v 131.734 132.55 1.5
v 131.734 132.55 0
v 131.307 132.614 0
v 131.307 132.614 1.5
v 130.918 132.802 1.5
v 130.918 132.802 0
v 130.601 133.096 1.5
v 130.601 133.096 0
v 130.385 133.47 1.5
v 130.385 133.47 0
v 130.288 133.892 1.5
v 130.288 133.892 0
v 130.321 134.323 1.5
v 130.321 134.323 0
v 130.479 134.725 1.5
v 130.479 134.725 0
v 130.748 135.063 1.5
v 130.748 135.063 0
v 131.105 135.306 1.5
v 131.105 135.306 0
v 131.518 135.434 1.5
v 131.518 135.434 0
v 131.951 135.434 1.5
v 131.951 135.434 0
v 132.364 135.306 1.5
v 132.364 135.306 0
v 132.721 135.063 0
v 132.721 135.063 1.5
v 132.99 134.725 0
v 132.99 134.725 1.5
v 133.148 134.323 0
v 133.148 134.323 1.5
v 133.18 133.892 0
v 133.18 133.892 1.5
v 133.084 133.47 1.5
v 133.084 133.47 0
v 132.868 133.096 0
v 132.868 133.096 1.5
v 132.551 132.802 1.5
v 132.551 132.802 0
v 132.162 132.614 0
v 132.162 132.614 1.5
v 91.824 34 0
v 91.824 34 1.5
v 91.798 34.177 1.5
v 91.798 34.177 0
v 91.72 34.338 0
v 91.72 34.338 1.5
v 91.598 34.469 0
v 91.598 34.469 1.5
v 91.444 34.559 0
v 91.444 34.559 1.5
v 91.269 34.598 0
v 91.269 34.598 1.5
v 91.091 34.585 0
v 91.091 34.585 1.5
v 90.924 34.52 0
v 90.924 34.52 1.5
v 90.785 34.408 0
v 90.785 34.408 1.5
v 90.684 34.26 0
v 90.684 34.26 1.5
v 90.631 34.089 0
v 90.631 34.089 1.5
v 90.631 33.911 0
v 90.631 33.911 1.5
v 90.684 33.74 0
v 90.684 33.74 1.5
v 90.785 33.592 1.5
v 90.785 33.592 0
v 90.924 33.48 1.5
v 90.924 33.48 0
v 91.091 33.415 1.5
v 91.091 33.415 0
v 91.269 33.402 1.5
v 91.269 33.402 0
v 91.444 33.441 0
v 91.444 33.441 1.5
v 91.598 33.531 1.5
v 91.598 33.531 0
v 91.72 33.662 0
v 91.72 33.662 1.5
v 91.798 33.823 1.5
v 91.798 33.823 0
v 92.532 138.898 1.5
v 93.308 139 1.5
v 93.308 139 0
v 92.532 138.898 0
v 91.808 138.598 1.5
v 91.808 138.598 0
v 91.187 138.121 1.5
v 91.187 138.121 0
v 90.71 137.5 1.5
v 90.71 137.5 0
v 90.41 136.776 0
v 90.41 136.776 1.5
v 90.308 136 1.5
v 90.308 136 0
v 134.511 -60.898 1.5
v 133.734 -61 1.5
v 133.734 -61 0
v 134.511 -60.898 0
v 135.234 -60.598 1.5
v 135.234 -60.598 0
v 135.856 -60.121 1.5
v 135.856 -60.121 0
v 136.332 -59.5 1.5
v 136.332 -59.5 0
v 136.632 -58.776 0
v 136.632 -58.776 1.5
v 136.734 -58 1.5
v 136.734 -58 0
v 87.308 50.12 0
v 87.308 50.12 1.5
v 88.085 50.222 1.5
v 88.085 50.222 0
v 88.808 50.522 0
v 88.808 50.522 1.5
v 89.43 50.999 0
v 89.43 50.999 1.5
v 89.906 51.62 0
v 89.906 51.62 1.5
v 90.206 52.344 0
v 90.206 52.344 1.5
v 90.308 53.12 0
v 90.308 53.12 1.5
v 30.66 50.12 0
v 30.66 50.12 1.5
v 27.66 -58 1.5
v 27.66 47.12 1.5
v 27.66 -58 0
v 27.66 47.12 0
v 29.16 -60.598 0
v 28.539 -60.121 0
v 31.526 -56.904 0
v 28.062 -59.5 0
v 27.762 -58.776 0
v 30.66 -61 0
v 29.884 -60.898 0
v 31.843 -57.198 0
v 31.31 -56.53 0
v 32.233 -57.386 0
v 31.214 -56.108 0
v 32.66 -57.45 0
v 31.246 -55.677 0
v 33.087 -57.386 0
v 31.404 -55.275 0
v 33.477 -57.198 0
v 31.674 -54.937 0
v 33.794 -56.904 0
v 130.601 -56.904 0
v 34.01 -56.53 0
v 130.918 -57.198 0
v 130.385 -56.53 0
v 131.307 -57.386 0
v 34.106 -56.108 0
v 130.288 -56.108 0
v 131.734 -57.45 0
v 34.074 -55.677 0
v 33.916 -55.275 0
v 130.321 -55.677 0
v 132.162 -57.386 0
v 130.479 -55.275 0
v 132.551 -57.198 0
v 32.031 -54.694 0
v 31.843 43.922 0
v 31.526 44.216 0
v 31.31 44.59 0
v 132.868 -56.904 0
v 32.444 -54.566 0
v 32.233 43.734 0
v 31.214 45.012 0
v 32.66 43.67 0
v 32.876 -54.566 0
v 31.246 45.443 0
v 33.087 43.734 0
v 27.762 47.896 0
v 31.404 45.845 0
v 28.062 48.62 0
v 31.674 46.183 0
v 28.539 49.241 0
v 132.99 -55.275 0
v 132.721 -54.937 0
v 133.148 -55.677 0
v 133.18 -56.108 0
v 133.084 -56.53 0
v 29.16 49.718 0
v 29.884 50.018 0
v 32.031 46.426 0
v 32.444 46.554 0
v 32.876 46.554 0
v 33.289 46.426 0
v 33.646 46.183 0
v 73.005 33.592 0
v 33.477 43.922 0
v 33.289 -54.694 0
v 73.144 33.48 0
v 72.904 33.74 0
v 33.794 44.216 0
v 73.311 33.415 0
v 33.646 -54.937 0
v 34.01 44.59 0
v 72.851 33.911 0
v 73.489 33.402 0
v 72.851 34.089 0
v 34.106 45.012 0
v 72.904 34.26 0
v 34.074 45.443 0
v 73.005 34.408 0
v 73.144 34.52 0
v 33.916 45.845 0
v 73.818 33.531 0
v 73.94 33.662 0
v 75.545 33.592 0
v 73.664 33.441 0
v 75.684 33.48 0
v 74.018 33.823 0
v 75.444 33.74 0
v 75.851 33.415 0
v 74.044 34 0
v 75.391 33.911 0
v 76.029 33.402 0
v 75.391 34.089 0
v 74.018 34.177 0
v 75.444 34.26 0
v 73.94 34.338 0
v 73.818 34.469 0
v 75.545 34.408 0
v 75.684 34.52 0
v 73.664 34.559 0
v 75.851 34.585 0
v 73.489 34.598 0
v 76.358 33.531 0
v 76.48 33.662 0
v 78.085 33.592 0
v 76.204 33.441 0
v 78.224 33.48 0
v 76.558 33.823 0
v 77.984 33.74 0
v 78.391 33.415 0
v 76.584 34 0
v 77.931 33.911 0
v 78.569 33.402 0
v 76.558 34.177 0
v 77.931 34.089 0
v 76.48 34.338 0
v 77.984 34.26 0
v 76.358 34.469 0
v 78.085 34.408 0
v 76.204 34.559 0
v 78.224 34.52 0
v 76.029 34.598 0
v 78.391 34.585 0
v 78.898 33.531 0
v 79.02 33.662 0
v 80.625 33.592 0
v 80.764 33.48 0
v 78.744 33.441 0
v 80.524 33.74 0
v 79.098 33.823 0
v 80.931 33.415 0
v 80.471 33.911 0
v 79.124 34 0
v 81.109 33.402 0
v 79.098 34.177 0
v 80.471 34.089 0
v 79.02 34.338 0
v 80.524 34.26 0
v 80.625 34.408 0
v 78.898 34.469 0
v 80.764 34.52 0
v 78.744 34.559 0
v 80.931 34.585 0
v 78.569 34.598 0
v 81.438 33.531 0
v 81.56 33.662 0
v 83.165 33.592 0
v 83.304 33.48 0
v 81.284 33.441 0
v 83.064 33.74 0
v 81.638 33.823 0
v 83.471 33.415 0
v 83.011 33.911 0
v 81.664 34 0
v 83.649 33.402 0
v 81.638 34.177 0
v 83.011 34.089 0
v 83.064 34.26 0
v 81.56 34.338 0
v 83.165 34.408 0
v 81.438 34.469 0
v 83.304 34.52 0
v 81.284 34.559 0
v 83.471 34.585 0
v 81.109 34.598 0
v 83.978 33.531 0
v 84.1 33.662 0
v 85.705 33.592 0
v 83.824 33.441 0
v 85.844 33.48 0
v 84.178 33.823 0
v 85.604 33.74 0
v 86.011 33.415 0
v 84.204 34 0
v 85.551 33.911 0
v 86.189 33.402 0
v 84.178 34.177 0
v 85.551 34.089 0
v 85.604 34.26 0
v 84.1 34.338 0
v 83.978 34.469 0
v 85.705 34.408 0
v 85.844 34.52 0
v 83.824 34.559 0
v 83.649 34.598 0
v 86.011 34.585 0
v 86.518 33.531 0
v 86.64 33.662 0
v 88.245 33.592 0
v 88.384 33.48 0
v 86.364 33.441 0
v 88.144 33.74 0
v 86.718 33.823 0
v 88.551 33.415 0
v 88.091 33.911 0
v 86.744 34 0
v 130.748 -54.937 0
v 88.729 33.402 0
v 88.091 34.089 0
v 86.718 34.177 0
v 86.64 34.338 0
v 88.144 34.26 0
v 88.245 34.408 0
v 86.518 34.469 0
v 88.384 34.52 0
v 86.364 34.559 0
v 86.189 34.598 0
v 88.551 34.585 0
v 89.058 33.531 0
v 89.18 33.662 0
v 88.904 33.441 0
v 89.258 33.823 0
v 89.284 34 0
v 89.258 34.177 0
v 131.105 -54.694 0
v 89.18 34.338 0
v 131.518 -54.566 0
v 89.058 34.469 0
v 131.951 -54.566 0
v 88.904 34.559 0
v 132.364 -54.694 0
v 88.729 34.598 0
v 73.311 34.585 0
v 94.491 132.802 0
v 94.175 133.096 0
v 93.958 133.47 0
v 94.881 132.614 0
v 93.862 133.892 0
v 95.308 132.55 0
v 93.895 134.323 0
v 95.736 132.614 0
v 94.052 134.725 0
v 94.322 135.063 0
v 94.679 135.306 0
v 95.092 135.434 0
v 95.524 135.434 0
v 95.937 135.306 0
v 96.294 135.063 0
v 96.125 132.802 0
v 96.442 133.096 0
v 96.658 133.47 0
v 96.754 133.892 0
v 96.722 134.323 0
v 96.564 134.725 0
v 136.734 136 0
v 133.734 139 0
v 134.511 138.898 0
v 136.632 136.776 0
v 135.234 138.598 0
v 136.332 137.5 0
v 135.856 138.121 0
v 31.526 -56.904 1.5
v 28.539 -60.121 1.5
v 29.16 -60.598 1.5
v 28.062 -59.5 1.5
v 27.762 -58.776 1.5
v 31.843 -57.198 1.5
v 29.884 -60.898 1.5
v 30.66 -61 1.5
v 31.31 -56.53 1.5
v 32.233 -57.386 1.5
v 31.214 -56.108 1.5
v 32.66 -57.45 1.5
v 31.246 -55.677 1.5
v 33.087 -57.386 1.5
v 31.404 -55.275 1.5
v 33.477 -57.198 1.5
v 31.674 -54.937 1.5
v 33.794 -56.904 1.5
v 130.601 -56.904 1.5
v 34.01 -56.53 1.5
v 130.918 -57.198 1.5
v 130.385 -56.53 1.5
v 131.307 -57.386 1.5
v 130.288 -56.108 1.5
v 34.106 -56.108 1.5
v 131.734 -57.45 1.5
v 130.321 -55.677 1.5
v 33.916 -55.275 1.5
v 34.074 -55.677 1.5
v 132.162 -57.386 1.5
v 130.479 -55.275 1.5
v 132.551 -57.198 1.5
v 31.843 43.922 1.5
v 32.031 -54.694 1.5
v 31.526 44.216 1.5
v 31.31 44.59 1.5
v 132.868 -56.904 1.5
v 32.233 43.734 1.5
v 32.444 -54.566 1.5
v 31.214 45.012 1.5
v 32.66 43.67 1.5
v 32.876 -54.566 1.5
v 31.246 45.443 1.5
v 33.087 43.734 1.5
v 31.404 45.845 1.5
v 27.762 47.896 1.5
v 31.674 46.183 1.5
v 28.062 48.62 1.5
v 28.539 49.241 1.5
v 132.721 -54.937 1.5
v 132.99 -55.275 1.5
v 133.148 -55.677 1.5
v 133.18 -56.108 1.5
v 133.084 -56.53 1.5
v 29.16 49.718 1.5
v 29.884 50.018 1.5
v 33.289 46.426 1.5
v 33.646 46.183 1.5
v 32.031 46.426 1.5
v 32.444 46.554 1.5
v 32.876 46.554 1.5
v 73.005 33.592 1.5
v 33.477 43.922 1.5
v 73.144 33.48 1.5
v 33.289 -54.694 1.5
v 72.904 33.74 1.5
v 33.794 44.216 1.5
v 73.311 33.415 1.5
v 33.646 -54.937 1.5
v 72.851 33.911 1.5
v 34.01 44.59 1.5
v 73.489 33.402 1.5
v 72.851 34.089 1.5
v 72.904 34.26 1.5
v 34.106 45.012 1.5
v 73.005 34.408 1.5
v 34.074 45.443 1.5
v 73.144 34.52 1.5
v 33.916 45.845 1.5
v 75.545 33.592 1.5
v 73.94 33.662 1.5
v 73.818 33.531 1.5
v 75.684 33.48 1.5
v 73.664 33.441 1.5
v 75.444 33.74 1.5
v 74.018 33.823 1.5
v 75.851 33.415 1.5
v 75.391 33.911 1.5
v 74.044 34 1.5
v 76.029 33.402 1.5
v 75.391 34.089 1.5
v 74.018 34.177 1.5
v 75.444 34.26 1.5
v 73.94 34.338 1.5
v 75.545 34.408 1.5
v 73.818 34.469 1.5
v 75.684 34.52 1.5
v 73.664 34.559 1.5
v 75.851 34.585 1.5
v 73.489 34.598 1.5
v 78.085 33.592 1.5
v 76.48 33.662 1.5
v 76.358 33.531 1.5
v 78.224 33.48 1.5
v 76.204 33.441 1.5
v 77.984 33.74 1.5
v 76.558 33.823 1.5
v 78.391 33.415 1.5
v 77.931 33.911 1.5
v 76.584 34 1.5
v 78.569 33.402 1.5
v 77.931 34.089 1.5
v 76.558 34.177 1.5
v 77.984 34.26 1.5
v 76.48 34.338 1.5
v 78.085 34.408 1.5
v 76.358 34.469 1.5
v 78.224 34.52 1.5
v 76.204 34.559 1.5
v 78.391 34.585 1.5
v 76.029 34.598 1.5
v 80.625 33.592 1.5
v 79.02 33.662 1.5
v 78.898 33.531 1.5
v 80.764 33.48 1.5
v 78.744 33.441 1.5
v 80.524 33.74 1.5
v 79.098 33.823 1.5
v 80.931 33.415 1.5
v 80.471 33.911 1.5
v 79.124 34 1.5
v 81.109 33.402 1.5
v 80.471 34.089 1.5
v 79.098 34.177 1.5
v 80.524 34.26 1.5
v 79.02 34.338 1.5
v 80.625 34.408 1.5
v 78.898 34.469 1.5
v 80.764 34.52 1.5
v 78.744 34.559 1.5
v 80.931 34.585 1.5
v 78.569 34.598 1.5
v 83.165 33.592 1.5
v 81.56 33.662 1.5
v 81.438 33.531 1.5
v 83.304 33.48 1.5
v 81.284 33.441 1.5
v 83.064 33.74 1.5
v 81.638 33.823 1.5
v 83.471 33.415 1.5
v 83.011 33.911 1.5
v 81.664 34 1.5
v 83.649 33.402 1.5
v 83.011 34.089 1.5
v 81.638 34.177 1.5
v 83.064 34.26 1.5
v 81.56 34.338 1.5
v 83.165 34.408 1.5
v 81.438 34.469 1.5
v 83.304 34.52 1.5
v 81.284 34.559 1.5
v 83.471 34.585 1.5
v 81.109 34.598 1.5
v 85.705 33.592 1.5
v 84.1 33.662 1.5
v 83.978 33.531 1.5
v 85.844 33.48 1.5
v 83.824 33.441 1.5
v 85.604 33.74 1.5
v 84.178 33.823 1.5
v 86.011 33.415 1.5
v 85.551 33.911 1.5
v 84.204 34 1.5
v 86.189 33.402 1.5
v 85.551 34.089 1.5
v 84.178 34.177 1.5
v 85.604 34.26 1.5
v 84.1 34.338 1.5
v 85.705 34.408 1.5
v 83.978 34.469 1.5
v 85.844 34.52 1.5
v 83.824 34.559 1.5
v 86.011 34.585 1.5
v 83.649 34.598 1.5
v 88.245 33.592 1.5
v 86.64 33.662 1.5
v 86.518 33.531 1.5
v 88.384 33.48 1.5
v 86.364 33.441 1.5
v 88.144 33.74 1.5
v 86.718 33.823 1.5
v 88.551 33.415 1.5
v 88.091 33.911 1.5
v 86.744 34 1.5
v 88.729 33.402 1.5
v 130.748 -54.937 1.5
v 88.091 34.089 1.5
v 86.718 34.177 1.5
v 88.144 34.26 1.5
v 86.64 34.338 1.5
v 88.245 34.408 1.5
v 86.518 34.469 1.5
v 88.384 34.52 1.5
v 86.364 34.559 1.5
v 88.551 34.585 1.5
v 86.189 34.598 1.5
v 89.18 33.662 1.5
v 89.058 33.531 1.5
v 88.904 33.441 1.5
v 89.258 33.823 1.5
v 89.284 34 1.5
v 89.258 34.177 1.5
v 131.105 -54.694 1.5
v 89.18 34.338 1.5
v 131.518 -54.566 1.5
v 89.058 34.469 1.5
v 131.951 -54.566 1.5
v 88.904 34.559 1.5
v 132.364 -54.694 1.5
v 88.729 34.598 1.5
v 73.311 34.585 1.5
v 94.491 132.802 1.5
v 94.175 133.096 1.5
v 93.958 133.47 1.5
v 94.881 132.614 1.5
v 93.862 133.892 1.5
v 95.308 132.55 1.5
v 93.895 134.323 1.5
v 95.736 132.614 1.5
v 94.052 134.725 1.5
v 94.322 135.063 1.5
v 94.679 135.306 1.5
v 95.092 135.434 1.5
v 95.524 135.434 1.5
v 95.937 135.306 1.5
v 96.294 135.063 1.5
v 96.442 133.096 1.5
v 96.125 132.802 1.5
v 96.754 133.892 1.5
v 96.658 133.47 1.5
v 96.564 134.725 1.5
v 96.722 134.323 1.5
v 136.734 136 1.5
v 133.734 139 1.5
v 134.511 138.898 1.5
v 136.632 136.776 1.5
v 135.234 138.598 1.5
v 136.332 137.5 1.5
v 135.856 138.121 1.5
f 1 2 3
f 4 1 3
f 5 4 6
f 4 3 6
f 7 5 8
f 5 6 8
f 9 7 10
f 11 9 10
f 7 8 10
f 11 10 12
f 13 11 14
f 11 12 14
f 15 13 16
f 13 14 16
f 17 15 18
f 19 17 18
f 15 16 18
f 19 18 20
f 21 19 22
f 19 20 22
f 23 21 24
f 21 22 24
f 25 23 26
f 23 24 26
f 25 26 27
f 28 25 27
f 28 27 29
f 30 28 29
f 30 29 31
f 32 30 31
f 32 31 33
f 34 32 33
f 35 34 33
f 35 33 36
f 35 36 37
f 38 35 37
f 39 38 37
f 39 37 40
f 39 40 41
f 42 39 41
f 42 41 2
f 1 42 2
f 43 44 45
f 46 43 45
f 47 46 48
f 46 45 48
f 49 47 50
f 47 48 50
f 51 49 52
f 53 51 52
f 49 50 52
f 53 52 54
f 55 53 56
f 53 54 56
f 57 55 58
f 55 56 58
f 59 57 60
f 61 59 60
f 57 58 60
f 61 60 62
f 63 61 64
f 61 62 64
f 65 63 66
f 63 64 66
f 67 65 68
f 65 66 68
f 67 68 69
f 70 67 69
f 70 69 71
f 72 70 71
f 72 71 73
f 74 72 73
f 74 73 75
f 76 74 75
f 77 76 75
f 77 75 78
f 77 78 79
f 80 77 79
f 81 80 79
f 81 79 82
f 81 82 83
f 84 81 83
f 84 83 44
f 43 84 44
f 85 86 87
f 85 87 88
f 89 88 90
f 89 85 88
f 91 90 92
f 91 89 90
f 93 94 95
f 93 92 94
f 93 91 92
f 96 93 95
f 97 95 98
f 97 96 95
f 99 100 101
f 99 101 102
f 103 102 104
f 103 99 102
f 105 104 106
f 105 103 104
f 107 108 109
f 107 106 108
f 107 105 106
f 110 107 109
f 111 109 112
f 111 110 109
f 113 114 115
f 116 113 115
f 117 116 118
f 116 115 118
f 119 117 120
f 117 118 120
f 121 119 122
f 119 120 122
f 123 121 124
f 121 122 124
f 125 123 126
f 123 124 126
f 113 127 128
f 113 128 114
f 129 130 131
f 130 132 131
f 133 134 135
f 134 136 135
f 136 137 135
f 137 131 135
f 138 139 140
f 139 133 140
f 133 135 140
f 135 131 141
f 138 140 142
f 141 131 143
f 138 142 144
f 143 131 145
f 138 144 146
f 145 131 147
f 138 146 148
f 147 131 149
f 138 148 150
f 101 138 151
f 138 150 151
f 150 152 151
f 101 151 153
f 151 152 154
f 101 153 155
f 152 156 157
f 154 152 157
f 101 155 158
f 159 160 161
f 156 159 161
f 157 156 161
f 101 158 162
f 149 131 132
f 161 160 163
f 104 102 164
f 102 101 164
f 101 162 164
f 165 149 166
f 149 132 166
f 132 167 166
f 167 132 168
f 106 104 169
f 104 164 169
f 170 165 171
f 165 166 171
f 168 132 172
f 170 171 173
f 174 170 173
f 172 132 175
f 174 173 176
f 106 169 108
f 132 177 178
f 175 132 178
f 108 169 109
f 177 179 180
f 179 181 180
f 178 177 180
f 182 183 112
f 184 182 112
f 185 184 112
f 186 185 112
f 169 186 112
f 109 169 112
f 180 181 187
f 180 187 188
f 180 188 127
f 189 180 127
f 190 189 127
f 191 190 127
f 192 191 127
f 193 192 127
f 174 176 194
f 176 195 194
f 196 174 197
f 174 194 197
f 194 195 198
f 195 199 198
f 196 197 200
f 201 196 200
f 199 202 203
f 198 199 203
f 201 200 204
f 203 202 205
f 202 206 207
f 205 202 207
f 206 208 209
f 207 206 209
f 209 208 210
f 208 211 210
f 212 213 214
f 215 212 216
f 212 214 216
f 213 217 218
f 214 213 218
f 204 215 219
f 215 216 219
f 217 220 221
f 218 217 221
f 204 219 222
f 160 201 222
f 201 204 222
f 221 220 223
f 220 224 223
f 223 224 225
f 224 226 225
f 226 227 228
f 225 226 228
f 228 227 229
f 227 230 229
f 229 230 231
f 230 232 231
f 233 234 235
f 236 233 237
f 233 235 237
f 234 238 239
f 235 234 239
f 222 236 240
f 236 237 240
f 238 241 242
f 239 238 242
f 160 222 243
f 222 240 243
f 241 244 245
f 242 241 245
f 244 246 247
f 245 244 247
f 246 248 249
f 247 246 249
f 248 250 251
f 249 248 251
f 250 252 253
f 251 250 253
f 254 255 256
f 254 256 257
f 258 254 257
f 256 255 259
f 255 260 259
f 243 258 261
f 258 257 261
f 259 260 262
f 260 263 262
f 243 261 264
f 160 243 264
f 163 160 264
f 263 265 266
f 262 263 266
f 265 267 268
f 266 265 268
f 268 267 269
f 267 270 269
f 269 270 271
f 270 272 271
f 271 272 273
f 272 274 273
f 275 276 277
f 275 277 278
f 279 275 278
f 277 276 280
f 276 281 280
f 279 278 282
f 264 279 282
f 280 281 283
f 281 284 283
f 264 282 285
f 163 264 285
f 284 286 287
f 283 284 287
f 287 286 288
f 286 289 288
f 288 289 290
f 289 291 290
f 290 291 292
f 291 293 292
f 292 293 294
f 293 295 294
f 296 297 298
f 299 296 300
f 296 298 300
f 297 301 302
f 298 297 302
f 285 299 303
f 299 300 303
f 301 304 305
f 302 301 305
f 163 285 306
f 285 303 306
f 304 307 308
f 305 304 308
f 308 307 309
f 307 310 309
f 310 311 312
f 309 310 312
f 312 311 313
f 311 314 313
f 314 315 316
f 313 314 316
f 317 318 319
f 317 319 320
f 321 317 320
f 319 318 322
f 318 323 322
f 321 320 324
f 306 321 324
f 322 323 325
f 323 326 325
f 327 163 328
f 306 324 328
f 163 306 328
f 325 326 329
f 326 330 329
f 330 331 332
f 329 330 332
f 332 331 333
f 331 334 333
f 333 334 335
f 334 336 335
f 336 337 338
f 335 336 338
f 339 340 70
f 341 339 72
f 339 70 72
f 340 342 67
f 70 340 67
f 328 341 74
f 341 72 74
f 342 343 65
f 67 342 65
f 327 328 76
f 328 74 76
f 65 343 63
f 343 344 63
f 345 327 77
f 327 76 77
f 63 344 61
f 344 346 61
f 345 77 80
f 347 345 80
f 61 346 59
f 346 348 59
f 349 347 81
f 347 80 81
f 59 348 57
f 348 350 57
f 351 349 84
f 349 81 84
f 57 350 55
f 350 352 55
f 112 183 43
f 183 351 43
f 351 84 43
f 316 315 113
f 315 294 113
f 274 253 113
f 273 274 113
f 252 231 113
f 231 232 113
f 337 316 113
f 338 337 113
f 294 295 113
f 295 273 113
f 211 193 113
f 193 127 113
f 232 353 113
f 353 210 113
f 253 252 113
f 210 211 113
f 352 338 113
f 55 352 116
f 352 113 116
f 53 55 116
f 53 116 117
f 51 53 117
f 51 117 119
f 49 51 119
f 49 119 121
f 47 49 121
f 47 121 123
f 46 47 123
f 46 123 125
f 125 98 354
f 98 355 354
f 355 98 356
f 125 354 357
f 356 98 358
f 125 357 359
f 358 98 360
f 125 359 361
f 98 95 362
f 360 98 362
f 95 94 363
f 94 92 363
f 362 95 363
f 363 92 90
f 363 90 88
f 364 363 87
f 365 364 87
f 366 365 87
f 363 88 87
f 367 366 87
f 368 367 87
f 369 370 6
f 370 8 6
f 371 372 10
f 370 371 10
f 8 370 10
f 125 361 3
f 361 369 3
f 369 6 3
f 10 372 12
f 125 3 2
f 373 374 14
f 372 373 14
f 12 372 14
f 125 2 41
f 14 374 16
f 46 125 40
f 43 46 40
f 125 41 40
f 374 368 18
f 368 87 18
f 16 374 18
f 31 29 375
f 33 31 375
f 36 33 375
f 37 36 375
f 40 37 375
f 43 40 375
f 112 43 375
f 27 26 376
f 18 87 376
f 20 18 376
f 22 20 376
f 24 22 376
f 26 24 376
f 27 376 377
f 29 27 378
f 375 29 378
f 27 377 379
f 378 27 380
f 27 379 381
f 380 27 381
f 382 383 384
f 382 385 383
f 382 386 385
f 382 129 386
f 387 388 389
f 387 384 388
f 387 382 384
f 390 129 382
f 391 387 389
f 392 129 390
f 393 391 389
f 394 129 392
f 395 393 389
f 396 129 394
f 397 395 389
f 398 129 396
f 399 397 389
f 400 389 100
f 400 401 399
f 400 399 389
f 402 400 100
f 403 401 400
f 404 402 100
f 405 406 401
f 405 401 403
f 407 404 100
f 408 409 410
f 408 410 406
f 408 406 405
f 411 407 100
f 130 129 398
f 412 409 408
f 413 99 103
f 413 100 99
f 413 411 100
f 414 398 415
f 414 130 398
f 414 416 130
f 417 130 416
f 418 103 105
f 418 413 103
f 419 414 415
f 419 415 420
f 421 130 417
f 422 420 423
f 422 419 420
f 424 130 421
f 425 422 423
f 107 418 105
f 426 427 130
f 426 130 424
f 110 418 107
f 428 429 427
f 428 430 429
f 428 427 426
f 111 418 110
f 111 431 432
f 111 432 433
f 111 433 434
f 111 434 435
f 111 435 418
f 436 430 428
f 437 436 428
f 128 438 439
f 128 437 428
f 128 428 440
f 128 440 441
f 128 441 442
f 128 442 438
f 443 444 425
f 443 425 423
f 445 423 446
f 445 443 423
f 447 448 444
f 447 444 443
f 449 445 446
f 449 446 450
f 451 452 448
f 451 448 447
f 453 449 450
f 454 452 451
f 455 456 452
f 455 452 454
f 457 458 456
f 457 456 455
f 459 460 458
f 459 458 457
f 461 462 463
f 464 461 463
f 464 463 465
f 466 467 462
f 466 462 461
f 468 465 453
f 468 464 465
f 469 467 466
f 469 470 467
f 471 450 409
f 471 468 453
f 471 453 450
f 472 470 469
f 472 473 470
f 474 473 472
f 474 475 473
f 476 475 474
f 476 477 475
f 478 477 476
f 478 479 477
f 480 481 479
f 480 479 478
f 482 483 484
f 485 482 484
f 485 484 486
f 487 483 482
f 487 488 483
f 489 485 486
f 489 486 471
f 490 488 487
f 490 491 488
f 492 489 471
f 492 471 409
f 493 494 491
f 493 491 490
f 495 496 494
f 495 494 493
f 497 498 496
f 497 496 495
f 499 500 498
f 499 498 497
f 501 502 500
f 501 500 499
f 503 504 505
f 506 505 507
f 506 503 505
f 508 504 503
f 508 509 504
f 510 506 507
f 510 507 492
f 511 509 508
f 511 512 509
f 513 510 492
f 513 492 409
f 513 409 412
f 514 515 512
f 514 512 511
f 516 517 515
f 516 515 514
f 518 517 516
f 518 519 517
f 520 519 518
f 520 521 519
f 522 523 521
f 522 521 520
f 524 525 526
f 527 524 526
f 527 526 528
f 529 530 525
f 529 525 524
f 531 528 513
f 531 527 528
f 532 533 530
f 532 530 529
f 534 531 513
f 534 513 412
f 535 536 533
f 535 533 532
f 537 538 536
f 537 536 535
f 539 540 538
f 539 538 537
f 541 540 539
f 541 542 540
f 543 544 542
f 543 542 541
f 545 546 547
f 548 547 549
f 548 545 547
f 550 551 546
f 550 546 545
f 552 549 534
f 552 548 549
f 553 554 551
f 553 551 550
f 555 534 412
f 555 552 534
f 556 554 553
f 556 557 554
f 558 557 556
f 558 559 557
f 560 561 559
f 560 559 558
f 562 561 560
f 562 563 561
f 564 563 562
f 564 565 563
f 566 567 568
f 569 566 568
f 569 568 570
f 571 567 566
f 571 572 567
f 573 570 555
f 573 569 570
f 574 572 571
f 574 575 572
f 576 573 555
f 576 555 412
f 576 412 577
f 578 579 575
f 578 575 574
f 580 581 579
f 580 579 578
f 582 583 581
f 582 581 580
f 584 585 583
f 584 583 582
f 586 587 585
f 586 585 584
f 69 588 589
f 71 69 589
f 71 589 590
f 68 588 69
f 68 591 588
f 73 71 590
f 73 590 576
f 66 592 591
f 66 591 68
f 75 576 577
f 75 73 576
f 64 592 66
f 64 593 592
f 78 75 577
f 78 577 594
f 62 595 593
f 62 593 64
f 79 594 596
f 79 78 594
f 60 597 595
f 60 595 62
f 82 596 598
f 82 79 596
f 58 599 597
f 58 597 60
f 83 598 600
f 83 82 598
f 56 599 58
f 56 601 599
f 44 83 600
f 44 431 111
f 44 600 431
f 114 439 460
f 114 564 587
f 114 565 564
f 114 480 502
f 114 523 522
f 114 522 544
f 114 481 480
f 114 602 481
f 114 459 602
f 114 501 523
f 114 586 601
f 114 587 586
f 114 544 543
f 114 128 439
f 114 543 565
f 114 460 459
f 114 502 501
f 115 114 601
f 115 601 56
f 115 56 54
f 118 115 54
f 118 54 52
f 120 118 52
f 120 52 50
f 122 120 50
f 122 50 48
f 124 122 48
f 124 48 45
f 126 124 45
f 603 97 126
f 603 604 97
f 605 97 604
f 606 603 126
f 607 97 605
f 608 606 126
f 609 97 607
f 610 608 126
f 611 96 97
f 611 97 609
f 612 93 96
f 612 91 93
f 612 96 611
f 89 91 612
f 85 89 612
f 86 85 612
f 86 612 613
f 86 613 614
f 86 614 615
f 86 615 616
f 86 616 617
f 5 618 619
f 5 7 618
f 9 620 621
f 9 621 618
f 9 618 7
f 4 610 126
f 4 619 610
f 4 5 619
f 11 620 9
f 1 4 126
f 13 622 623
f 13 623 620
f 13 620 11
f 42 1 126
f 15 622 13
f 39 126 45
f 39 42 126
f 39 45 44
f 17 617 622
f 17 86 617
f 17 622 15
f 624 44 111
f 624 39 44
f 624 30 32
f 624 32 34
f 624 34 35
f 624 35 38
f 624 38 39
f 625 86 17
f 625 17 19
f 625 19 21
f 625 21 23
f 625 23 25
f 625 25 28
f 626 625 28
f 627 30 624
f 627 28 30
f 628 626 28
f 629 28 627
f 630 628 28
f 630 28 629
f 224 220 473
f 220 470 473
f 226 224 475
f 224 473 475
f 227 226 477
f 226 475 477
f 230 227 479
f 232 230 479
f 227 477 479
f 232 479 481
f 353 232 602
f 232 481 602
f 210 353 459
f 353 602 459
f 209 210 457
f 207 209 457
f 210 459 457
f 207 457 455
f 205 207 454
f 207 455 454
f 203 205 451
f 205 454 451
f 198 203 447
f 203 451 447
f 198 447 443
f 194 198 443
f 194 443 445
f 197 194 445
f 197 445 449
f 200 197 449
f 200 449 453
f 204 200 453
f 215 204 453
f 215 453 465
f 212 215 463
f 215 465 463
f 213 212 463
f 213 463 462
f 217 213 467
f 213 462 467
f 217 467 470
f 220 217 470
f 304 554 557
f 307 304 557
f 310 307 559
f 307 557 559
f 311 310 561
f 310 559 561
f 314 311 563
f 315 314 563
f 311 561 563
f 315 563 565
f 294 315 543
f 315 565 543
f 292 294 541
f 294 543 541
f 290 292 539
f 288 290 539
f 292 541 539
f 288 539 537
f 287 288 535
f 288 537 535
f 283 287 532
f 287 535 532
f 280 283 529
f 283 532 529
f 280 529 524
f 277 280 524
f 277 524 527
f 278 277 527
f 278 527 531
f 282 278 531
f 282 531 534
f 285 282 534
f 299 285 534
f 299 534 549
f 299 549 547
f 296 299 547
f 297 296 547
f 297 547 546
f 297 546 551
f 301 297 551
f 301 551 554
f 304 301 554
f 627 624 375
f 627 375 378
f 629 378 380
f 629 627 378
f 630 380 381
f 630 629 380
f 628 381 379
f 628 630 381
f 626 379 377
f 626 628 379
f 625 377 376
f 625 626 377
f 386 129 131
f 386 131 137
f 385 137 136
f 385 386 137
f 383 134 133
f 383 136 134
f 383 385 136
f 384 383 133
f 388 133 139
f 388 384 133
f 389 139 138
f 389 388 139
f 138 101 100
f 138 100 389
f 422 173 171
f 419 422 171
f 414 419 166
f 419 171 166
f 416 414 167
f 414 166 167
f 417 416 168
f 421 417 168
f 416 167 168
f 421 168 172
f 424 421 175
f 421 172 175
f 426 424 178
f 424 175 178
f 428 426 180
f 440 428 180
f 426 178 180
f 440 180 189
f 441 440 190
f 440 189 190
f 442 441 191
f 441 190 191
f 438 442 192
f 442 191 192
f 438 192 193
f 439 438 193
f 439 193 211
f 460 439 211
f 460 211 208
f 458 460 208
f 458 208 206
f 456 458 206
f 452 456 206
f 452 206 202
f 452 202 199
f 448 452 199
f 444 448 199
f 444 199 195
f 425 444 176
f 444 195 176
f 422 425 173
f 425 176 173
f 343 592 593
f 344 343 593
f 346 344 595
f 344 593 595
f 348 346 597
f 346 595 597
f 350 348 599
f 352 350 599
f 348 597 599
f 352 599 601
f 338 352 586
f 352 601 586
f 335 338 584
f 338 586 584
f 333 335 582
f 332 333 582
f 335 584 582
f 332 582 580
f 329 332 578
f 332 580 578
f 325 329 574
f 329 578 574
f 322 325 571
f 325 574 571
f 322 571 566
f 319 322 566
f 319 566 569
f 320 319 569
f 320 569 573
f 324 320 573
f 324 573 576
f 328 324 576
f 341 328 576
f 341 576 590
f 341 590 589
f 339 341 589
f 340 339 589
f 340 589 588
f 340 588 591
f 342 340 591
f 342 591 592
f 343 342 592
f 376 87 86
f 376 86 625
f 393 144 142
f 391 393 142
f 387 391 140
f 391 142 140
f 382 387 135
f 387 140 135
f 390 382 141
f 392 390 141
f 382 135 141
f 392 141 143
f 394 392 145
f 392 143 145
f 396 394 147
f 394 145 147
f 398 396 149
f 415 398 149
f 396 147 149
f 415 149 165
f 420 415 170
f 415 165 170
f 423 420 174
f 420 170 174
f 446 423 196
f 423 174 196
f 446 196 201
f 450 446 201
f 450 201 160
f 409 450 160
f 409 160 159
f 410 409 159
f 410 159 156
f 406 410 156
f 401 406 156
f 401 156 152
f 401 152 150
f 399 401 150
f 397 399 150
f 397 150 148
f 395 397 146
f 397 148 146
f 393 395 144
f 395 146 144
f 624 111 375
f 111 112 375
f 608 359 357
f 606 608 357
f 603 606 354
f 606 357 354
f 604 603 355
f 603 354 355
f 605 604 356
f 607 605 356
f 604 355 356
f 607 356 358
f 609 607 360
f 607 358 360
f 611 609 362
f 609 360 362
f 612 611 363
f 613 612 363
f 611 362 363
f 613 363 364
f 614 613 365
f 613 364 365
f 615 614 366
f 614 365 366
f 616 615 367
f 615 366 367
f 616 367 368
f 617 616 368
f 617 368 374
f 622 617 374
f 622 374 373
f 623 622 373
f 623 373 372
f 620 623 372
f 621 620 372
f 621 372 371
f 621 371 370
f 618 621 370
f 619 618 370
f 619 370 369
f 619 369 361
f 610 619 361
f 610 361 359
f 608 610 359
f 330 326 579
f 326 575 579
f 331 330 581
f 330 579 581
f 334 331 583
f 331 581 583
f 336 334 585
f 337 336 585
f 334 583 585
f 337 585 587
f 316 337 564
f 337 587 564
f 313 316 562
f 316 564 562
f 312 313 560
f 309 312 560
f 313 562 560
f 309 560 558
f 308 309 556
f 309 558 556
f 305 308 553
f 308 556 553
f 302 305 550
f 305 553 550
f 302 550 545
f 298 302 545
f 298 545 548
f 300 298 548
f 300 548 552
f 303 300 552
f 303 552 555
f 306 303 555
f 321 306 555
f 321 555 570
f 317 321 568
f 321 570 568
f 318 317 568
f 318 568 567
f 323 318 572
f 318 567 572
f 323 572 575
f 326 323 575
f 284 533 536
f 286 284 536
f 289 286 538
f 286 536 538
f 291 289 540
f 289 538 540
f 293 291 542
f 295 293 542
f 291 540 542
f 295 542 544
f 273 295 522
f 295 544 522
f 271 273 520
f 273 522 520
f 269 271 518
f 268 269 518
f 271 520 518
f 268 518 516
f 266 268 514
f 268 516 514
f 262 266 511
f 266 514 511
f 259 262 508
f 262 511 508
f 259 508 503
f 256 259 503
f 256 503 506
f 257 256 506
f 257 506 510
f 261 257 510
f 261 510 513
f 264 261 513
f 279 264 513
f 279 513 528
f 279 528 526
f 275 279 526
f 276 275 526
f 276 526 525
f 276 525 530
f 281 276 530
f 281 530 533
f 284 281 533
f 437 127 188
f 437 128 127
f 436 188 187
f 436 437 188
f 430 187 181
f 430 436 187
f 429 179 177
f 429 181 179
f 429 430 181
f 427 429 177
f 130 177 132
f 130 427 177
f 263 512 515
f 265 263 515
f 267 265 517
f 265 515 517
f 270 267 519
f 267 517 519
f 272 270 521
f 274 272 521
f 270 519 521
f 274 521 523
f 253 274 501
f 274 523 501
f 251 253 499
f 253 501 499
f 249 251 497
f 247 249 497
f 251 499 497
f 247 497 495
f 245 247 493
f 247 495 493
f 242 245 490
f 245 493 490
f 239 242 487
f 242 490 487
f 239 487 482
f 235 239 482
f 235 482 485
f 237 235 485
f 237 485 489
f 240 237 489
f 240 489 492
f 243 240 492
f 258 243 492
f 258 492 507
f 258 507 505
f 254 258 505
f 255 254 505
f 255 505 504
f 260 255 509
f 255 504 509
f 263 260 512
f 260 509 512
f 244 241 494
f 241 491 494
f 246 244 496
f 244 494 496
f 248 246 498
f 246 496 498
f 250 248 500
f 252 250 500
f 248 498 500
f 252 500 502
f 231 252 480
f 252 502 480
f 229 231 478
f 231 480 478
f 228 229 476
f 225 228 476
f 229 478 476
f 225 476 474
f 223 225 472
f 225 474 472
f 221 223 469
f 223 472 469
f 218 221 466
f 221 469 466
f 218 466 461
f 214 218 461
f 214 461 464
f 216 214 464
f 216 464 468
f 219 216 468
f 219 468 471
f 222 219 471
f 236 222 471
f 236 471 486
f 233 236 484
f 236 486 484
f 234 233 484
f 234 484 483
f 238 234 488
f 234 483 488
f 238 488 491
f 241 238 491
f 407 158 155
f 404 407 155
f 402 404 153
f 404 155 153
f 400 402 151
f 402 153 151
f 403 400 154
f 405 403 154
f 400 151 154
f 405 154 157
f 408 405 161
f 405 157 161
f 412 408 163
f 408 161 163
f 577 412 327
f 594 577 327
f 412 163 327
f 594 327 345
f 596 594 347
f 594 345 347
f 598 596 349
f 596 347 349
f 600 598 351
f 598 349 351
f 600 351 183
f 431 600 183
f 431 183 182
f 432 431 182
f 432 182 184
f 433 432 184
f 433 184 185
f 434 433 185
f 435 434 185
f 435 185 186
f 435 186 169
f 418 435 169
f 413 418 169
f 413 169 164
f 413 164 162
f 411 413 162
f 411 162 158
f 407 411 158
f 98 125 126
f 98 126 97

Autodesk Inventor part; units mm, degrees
ref_plane "YZ Plane" through (0, 0, 0) normal (1, 0, 0) x (0, 1, 0)
ref_plane "РабПлоскость1" through (0, 0, 0) normal (0, 0, 1) x (1, 0, 0)
ref_plane "РабПлоскость2" through (0, 0, 0) normal (0, 0, 1) x (1, 0, 0)
sketch "Эскиз2" plane through (0, 0, 0) normal (0, 0, 1) x (1, 0, 0)
  line L0 (164.5082, 55.3787) -> (164.5082, 22.6213)
  line L1 (152.0082, 55.3787) -> (164.5082, 55.3787)
  spline S0 degree 4 poles (142.0082, 66.7804) (141.9936, 65.5806) (142.2897, 63.8407) (143.0904, 61.8123) (144.7867, 59.6039) (146.7684, 57.7973) (148.9036, 56.5519) (150.6395, 55.9298) (152.0082, 55.3787) knots 0 0 0 0 0 0.305903 0.428365 0.551581 0.676311 1 1 1 1 1
  line L2 (142.0082, 89.6988) -> (142.0082, 66.7804)
  spline S1 degree 4 poles (142.0976, 90.5077) (142.1863, 90.3272) (142.1406, 90.1079) (142.065, 89.9075) (142.0082, 89.6988) knots 0 0 0 0 0 1 1 1 1 1
  ellipse E0 centre (144.0082, 89.6716) end of major axis (144.0082, 92.5) minor radius 2 (144.0082, 92.5) -> (142.0976, 90.5077) ccw
  line L3 (144.0082, 92.5) -> (149.4338, 92.5)
  line L4 (149.4338, 92.5) -> (149.4338, 92.525)
  line L5 (149.4338, 92.525) -> (142.946, 92.525)
  ellipse E1 centre (142.946, 98.525) end of major axis (136.7344, 98.525) minor radius 6 (136.7344, 98.525) -> (142.946, 92.525) ccw
  line L6 (136.7344, 98.525) -> (136.7344, 100.025)
  ellipse E2 centre (142.946, 100.025) end of major axis (136.7344, 100.025) minor radius 6 (142.946, 106.025) -> (136.7344, 100.025) ccw
  line L7 (142.946, 106.025) -> (149.4338, 106.025)
  line L8 (149.4338, 106.025) -> (149.4338, 106.05)
  line L9 (149.4338, 106.05) -> (144.0082, 106.05)
  ellipse E3 centre (144.0082, 108.8784) end of major axis (144.0082, 106.05) minor radius 2 (142.0976, 108.0423) -> (144.0082, 106.05) ccw
  spline S2 degree 4 poles (142.0082, 108.8512) (142.0222, 108.6489) (142.0418, 108.4466) (142.067, 108.2444) (142.0976, 108.0423) knots 0 0 0 0 0 1 1 1 1 1
  line L10 (142.0082, 108.8512) -> (142.0082, 139)
  arc A0 (142.0082, 139) -> (137.0082, 144) centre (137.0082, 139) ccw
  line L11 (137.0082, 144) -> (27.0082, 144)
  arc A1 (27.0082, 144) -> (22.0082, 139) centre (27.0082, 139) ccw
  line L12 (22.0082, 139) -> (22.0082, 108.8512)
  spline S3 degree 4 poles (21.9188, 108.0423) (21.9596, 108.2417) (21.9876, 108.4433) (22.0035, 108.6467) (22.0082, 108.8512) knots 0 0 0 0 0 1 1 1 1 1
  ellipse E4 centre (20.0082, 108.8784) end of major axis (20.0082, 106.05) minor radius 2 (20.0082, 106.05) -> (21.9188, 108.0423) ccw
  line L13 (14.5826, 106.05) -> (20.0082, 106.05)
  line L14 (14.5826, 106.025) -> (14.5826, 106.05)
  line L15 (21.0704, 106.025) -> (14.5826, 106.025)
  ellipse E5 centre (21.0704, 100.025) end of major axis (27.282, 100.025) minor radius 6 (27.282, 100.025) -> (21.0704, 106.025) ccw
  ellipse E6 centre (21.0704, 98.525) end of major axis (27.282, 98.525) minor radius 6 (21.0704, 92.525) -> (27.282, 98.525) ccw
  line L16 (14.5826, 92.525) -> (21.0704, 92.525)
  line L17 (14.5826, 92.5) -> (14.5826, 92.525)
  line L18 (20.0082, 92.5) -> (14.5826, 92.5)
  ellipse E7 centre (20.0082, 89.6716) end of major axis (20.0082, 92.5) minor radius 2 (21.9188, 90.5077) -> (20.0082, 92.5) ccw
  spline S4 degree 4 poles (22.0082, 89.6988) (22.0001, 89.9001) (21.9823, 90.1037) (21.9553, 90.3071) (21.9188, 90.5077) knots 0 0 0 0 0 1 1 1 1 1
  line L19 (22.0082, 89.6988) -> (22.0082, 66.7804)
  spline S5 degree 4 poles (12.0082, 55.3787) (13.3543, 55.9133) (15.0972, 56.5843) (17.1914, 57.7632) (19.2093, 59.6353) (20.8508, 61.7502) (21.742, 63.9004) (21.9889, 65.5297) (22.0082, 66.7804) knots 0 0 0 0 0 0.323057 0.447569 0.570948 0.693515 1 1 1 1 1
  line L20 (-0.4918, 55.3787) -> (12.0082, 55.3787)
  line L21 (-0.4918, 22.6213) -> (-0.4918, 55.3787)
  line L22 (12.0082, 22.6213) -> (-0.4918, 22.6213)
  spline S6 degree 4 poles (22.0082, 11.2196) (21.9907, 12.4712) (21.7455, 14.1022) (20.8556, 16.2534) (19.2129, 18.3699) (17.1941, 20.2411) (15.0987, 21.4185) (13.3552, 22.0877) (12.0082, 22.6213) knots 0 0 0 0 0 0.306528 0.4291 0.552475 0.676977 1 1 1 1 1
  line L23 (22.0082, -11.6988) -> (22.0082, 11.2196)
  spline S7 degree 4 poles (22.2969, -12.5077) (22.2375, -12.3039) (22.1691, -12.101) (22.0924, -11.8993) (22.0082, -11.6988) knots 0 0 0 0 0 1 1 1 1 1
  ellipse E8 centre (20.3863, -11.6716) end of major axis (20.3863, -14.5) minor radius 2 (20.3863, -14.5) -> (22.2969, -12.5077) ccw
  line L24 (20.3863, -14.5) -> (14.9607, -14.5)
  line L25 (14.9607, -14.5) -> (14.9607, -14.525)
  line L26 (14.9607, -14.525) -> (21.4484, -14.525)
  ellipse E9 centre (21.4484, -20.525) end of major axis (27.6601, -20.525) minor radius 6 (27.6601, -20.525) -> (21.4484, -14.525) ccw
  line L27 (27.6601, -20.525) -> (27.6601, -22.025)
  ellipse E10 centre (21.4484, -22.025) end of major axis (27.6601, -22.025) minor radius 6 (21.4484, -28.025) -> (27.6601, -22.025) ccw
  line L28 (21.4484, -28.025) -> (14.9607, -28.025)
  line L29 (14.9607, -28.025) -> (14.9607, -28.05)
  line L30 (14.9607, -28.05) -> (20.3863, -28.05)
  ellipse E11 centre (20.3863, -30.8784) end of major axis (20.3863, -28.05) minor radius 2 (22.2969, -30.0423) -> (20.3863, -28.05) ccw
  spline S8 degree 4 poles (22.0082, -30.8512) (22.0994, -30.6437) (22.1874, -30.4372) (22.2667, -30.2332) (22.2969, -30.0423) knots 0 0 0 0 0 1 1 1 1 1
  line L31 (22.0082, -30.8512) -> (22.0082, -61)
  arc A2 (22.0082, -61) -> (27.0082, -66) centre (27.0082, -61) ccw
  line L32 (27.0082, -66) -> (137.0082, -66)
  arc A3 (137.0082, -66) -> (142.0082, -61) centre (137.0082, -61) ccw
  line L33 (142.0082, -61) -> (142.0082, -30.8512)
  spline S9 degree 4 poles (142.0976, -30.0423) (142.0618, -30.2424) (142.0345, -30.444) (142.0164, -30.6471) (142.0082, -30.8512) knots 0 0 0 0 0 1 1 1 1 1
  ellipse E12 centre (144.0082, -30.8784) end of major axis (144.0082, -28.05) minor radius 2 (144.0082, -28.05) -> (142.0976, -30.0423) ccw
  line L34 (149.4338, -28.05) -> (144.0082, -28.05)
  line L35 (149.4338, -28.025) -> (149.4338, -28.05)
  line L36 (142.946, -28.025) -> (149.4338, -28.025)
  ellipse E13 centre (142.946, -22.025) end of major axis (136.7344, -22.025) minor radius 6 (136.7344, -22.025) -> (142.946, -28.025) ccw
  line L37 (136.7344, -20.525) -> (136.7344, -22.025)
  ellipse E14 centre (142.946, -20.525) end of major axis (136.7344, -20.525) minor radius 6 (142.0082, -14.5938) -> (136.7344, -20.525) ccw
  spline S10 degree 4 poles (143.3575, -14.5382) (143.017, -14.5392) (142.6788, -14.5494) (142.3414, -14.5663) (142.0082, -14.5938) knots 0 0 0 0 0 1 1 1 1 1
  spline S11 degree 4 poles (143.3575, -14.5382) (143.1143, -14.3292) (142.8382, -14.0321) (142.6629, -13.7922) (142.4735, -13.4852) knots 0 0 0 0 0 1 1 1 1 1
  ellipse E15 centre (144.0082, -11.6716) end of major axis (144.0082, -8.8431) minor radius 2 (142.0976, -12.5077) -> (142.4735, -13.4852) ccw
  spline S12 degree 4 poles (142.0976, -12.5077) (142.0566, -12.3073) (142.0277, -12.1043) (142.0113, -11.9008) (142.0082, -11.6988) knots 0 0 0 0 0 1 1 1 1 1
  line L38 (142.0082, 11.2196) -> (142.0082, -11.6988)
  spline S13 degree 4 poles (152.0082, 22.6213) (150.6678, 22.0949) (148.9359, 21.4381) (146.8415, 20.2599) (144.8098, 18.3825) (143.1469, 16.2574) (142.2323, 14.098) (142.0013, 12.4654) (142.0082, 11.2196) knots 0 0 0 0 0 0.322163 0.446837 0.570623 0.693583 1 1 1 1 1
  line L39 (164.5082, 22.6213) -> (152.0082, 22.6213)
  line L40 (27.282, 98.525) -> (27.282, 100.025)
  line L41 (27.6601, -66) -> (136.7344, -66)
  line L42 (136.7344, -66) -> (136.7344, 55.12)
  line L43 (85.3082, 55.12) -> (27.6601, 55.12)
  line L44 (27.6601, 55.12) -> (27.6601, -66)
  line L45 (49.6082, 55.12) -> (60.6082, 55.12) projected
  line L46 (85.3082, 55.12) -> (85.3082, 144)
  line L47 (85.3082, 144) -> (136.7344, 144)
  line L48 (136.7344, 144) -> (136.7344, 55.12)
  line L49 (85.3082, 113.52) -> (85.3082, 107.52) projected
  line L50 (84.3244, 70.87) -> (84.3244, 64.87) projected
  line L51 (27.6601, 50.12) -> (90.3082, 50.12)
  line L52 (136.7344, 57.0858) -> (136.7344, -61)
  line L53 (136.7344, -61) -> (27.6601, -61)
  line L54 (27.6601, -61) -> (27.6601, 50.12)
  line L55 (90.3082, 50.12) -> (90.3082, 139)
  line L56 (90.3082, 139) -> (136.7344, 139)
  line L57 (136.7344, 139) -> (136.7344, 57.0858)
  point P0 (0, 0)
  point P1 (142.0243, 108.6495)
  point P2 (142.0445, 108.4475)
  point P3 (142.069, 108.2451)
  point P4 (21.9548, 108.2422)
  point P5 (21.9815, 108.4436)
  point P6 (21.9992, 108.6466)
  point P7 (21.9966, 89.8995)
  point P8 (21.9778, 90.1023)
  point P9 (21.9518, 90.3056)
  point P10 (14.1516, 56.2573)
  point P11 (16.0588, 57.2184)
  point P12 (17.7454, 58.3637)
  point P13 (19.1678, 59.6884)
  point P14 (20.3459, 61.2222)
  point P15 (21.2579, 62.9881)
  point P16 (21.8122, 64.8416)
  point P17 (21.8145, 13.1602)
  point P18 (21.2616, 15.0151)
  point P19 (20.35, 16.7819)
  point P20 (19.1713, 18.3166)
  point P21 (17.7482, 19.6409)
  point P22 (16.0609, 20.785)
  point P23 (14.1529, 21.7445)
  point P24 (22.2348, -12.3061)
  point P25 (22.1658, -12.104)
  point P26 (22.0903, -11.9016)
  point P27 (22.102, -30.634)
  point P28 (22.1869, -30.423)
  point P29 (22.2547, -30.224)
  point P30 (142.0651, -30.2427)
  point P31 (142.0392, -30.4442)
  point P32 (142.0201, -30.6471)
  point P33 (143.0157, -14.5425)
  point P34 (142.6767, -14.5533)
  point P35 (142.3406, -14.5702)
  point P36 (143.1122, -14.3072)
  point P37 (142.8714, -14.0419)
  point P38 (142.6642, -13.7743)
  point P39 (142.061, -12.3056)
  point P40 (142.0338, -12.1027)
  point P41 (142.0162, -11.9001)
  point P42 (149.8807, 21.759)
  point P43 (147.9821, 20.8085)
  point P44 (146.2898, 19.6634)
  point P45 (144.8524, 18.3311)
  point P46 (143.6547, 16.7844)
  point P47 (142.7262, 15.0053)
  point P48 (142.1752, 13.1484)
  point P49 (142.1418, 90.326)
  point P50 (142.1248, 90.1256)
  point P51 (142.0712, 89.914)
  point P52 (142.1871, 64.8545)
  point P53 (142.7332, 62.9853)
  point P54 (143.6182, 61.2481)
  point P55 (144.8211, 59.6733)
  point P56 (146.2281, 58.3691)
  point P57 (147.919, 57.2204)
  point P58 (149.8389, 56.2585)
  point P59 (82.0082, 39)
  point P60 (136.7344, -21.275)
  point P61 (27.6601, -21.275)
  dimension "d5" = 0
  dimension "d6" = 0
  dimension "d7" = 0
  dimension "d8" = 0
  dimension "d9" = 0
  dimension "d10" = 5
  dimension "d11" = 5
  dimension "d12" = 0
  dimension "d13" = 5
  dimension "d14" = 0
  dimension "d15" = 5
extrude "Выдавливание1" add sketch "Эскиз2" along normal blind 1.5 contours L37 L42 L53 L44 L27 L51 L55 L56 L48 L6
fillet "Сопряжение1" radius 3 6 edges at (27.6601, 50.12, 0.75) (90.3082, 50.12, 0.75) (90.3082, 139, 0.75) (136.7344, 139, 0.75) (136.7344, -61, 0.75) (27.6601, -61, 0.75)
sketch "Эскиз3" plane through (0, 0, 1.5) normal (0, 0, 1) x (1, 0, 0)
  arc A0 (27.6601, -58) -> (30.6601, -61) centre (30.6601, -58) ccw projected
  line L0 (30.6601, -61) -> (133.7344, -61) projected
  arc A1 (133.7344, -61) -> (136.7344, -58) centre (133.7344, -58) ccw projected
  line L1 (136.7344, -58) -> (136.7344, 136) projected
  arc A2 (136.7344, 136) -> (133.7344, 139) centre (133.7344, 136) ccw projected
  line L2 (133.7344, 139) -> (93.3082, 139) projected
  arc A3 (93.3082, 139) -> (90.3082, 136) centre (93.3082, 136) ccw projected
  line L3 (90.3082, 136) -> (90.3082, 53.12) projected
  arc A4 (87.3082, 50.12) -> (90.3082, 53.12) centre (87.3082, 53.12) ccw projected
  line L4 (87.3082, 50.12) -> (30.6601, 50.12) projected
  arc A5 (30.6601, 50.12) -> (27.6601, 47.12) centre (30.6601, 47.12) ccw projected
  line L5 (27.6601, 47.12) -> (27.6601, -58) projected
  circle A6 centre (32.6601, -56) radius 1.5
  circle A7 centre (32.6601, 45.12) radius 1.5
  circle A8 centre (131.7344, -56) radius 1.5
  circle A9 centre (131.7344, 134) radius 1.5
  circle A10 centre (95.3082, 134) radius 1.5
  point P0 (0, 0)
  dimension "d19" = 5
  dimension "d20" = 3
  dimension "d21" = 5
  dimension "d22" = 3
  dimension "d23" = 3
  dimension "d24" = 3
  dimension "d25" = 3
  dimension "d26" = 5
  dimension "d27" = 5
  dimension "d28" = 5
  dimension "d29" = 5
  dimension "d30" = 5
  dimension "d31" = 5
  dimension "d32" = 5
  dimension "d33" = 5
hole "Отверстие1" at (32.6601, 45.12, 1.5) at (32.6601, -56, 1.5) at (131.7344, -56, 1.5) at (131.7344, 134, 1.5) at (95.3082, 134, 1.5) direction (0, 0, -1) diameter 2.9 end through all clearance for "Винт с потайной головкой ISO 2009/7046" size "M2.5" standard "ISO"
sketch "Эскиз4" plane through (0, 0, 1.5) normal (0, 0, 1) x (1, 0, 0)
  circle A0 centre (73.4444, 34) radius 0.6 projected
  circle A1 centre (75.9844, 34) radius 0.6 projected
  circle A2 centre (78.5244, 34) radius 0.6 projected
  circle A3 centre (81.0644, 34) radius 0.6 projected
  circle A4 centre (83.6044, 34) radius 0.6 projected
  circle A5 centre (86.1444, 34) radius 0.6 projected
  circle A6 centre (88.6844, 34) radius 0.6 projected
  circle A7 centre (91.2244, 34) radius 0.6 projected
  point P0 (0, 0)
extrude "Выдавливание2" cut sketch "Эскиз4" against normal blind 10
properties part number "Motherboard"
